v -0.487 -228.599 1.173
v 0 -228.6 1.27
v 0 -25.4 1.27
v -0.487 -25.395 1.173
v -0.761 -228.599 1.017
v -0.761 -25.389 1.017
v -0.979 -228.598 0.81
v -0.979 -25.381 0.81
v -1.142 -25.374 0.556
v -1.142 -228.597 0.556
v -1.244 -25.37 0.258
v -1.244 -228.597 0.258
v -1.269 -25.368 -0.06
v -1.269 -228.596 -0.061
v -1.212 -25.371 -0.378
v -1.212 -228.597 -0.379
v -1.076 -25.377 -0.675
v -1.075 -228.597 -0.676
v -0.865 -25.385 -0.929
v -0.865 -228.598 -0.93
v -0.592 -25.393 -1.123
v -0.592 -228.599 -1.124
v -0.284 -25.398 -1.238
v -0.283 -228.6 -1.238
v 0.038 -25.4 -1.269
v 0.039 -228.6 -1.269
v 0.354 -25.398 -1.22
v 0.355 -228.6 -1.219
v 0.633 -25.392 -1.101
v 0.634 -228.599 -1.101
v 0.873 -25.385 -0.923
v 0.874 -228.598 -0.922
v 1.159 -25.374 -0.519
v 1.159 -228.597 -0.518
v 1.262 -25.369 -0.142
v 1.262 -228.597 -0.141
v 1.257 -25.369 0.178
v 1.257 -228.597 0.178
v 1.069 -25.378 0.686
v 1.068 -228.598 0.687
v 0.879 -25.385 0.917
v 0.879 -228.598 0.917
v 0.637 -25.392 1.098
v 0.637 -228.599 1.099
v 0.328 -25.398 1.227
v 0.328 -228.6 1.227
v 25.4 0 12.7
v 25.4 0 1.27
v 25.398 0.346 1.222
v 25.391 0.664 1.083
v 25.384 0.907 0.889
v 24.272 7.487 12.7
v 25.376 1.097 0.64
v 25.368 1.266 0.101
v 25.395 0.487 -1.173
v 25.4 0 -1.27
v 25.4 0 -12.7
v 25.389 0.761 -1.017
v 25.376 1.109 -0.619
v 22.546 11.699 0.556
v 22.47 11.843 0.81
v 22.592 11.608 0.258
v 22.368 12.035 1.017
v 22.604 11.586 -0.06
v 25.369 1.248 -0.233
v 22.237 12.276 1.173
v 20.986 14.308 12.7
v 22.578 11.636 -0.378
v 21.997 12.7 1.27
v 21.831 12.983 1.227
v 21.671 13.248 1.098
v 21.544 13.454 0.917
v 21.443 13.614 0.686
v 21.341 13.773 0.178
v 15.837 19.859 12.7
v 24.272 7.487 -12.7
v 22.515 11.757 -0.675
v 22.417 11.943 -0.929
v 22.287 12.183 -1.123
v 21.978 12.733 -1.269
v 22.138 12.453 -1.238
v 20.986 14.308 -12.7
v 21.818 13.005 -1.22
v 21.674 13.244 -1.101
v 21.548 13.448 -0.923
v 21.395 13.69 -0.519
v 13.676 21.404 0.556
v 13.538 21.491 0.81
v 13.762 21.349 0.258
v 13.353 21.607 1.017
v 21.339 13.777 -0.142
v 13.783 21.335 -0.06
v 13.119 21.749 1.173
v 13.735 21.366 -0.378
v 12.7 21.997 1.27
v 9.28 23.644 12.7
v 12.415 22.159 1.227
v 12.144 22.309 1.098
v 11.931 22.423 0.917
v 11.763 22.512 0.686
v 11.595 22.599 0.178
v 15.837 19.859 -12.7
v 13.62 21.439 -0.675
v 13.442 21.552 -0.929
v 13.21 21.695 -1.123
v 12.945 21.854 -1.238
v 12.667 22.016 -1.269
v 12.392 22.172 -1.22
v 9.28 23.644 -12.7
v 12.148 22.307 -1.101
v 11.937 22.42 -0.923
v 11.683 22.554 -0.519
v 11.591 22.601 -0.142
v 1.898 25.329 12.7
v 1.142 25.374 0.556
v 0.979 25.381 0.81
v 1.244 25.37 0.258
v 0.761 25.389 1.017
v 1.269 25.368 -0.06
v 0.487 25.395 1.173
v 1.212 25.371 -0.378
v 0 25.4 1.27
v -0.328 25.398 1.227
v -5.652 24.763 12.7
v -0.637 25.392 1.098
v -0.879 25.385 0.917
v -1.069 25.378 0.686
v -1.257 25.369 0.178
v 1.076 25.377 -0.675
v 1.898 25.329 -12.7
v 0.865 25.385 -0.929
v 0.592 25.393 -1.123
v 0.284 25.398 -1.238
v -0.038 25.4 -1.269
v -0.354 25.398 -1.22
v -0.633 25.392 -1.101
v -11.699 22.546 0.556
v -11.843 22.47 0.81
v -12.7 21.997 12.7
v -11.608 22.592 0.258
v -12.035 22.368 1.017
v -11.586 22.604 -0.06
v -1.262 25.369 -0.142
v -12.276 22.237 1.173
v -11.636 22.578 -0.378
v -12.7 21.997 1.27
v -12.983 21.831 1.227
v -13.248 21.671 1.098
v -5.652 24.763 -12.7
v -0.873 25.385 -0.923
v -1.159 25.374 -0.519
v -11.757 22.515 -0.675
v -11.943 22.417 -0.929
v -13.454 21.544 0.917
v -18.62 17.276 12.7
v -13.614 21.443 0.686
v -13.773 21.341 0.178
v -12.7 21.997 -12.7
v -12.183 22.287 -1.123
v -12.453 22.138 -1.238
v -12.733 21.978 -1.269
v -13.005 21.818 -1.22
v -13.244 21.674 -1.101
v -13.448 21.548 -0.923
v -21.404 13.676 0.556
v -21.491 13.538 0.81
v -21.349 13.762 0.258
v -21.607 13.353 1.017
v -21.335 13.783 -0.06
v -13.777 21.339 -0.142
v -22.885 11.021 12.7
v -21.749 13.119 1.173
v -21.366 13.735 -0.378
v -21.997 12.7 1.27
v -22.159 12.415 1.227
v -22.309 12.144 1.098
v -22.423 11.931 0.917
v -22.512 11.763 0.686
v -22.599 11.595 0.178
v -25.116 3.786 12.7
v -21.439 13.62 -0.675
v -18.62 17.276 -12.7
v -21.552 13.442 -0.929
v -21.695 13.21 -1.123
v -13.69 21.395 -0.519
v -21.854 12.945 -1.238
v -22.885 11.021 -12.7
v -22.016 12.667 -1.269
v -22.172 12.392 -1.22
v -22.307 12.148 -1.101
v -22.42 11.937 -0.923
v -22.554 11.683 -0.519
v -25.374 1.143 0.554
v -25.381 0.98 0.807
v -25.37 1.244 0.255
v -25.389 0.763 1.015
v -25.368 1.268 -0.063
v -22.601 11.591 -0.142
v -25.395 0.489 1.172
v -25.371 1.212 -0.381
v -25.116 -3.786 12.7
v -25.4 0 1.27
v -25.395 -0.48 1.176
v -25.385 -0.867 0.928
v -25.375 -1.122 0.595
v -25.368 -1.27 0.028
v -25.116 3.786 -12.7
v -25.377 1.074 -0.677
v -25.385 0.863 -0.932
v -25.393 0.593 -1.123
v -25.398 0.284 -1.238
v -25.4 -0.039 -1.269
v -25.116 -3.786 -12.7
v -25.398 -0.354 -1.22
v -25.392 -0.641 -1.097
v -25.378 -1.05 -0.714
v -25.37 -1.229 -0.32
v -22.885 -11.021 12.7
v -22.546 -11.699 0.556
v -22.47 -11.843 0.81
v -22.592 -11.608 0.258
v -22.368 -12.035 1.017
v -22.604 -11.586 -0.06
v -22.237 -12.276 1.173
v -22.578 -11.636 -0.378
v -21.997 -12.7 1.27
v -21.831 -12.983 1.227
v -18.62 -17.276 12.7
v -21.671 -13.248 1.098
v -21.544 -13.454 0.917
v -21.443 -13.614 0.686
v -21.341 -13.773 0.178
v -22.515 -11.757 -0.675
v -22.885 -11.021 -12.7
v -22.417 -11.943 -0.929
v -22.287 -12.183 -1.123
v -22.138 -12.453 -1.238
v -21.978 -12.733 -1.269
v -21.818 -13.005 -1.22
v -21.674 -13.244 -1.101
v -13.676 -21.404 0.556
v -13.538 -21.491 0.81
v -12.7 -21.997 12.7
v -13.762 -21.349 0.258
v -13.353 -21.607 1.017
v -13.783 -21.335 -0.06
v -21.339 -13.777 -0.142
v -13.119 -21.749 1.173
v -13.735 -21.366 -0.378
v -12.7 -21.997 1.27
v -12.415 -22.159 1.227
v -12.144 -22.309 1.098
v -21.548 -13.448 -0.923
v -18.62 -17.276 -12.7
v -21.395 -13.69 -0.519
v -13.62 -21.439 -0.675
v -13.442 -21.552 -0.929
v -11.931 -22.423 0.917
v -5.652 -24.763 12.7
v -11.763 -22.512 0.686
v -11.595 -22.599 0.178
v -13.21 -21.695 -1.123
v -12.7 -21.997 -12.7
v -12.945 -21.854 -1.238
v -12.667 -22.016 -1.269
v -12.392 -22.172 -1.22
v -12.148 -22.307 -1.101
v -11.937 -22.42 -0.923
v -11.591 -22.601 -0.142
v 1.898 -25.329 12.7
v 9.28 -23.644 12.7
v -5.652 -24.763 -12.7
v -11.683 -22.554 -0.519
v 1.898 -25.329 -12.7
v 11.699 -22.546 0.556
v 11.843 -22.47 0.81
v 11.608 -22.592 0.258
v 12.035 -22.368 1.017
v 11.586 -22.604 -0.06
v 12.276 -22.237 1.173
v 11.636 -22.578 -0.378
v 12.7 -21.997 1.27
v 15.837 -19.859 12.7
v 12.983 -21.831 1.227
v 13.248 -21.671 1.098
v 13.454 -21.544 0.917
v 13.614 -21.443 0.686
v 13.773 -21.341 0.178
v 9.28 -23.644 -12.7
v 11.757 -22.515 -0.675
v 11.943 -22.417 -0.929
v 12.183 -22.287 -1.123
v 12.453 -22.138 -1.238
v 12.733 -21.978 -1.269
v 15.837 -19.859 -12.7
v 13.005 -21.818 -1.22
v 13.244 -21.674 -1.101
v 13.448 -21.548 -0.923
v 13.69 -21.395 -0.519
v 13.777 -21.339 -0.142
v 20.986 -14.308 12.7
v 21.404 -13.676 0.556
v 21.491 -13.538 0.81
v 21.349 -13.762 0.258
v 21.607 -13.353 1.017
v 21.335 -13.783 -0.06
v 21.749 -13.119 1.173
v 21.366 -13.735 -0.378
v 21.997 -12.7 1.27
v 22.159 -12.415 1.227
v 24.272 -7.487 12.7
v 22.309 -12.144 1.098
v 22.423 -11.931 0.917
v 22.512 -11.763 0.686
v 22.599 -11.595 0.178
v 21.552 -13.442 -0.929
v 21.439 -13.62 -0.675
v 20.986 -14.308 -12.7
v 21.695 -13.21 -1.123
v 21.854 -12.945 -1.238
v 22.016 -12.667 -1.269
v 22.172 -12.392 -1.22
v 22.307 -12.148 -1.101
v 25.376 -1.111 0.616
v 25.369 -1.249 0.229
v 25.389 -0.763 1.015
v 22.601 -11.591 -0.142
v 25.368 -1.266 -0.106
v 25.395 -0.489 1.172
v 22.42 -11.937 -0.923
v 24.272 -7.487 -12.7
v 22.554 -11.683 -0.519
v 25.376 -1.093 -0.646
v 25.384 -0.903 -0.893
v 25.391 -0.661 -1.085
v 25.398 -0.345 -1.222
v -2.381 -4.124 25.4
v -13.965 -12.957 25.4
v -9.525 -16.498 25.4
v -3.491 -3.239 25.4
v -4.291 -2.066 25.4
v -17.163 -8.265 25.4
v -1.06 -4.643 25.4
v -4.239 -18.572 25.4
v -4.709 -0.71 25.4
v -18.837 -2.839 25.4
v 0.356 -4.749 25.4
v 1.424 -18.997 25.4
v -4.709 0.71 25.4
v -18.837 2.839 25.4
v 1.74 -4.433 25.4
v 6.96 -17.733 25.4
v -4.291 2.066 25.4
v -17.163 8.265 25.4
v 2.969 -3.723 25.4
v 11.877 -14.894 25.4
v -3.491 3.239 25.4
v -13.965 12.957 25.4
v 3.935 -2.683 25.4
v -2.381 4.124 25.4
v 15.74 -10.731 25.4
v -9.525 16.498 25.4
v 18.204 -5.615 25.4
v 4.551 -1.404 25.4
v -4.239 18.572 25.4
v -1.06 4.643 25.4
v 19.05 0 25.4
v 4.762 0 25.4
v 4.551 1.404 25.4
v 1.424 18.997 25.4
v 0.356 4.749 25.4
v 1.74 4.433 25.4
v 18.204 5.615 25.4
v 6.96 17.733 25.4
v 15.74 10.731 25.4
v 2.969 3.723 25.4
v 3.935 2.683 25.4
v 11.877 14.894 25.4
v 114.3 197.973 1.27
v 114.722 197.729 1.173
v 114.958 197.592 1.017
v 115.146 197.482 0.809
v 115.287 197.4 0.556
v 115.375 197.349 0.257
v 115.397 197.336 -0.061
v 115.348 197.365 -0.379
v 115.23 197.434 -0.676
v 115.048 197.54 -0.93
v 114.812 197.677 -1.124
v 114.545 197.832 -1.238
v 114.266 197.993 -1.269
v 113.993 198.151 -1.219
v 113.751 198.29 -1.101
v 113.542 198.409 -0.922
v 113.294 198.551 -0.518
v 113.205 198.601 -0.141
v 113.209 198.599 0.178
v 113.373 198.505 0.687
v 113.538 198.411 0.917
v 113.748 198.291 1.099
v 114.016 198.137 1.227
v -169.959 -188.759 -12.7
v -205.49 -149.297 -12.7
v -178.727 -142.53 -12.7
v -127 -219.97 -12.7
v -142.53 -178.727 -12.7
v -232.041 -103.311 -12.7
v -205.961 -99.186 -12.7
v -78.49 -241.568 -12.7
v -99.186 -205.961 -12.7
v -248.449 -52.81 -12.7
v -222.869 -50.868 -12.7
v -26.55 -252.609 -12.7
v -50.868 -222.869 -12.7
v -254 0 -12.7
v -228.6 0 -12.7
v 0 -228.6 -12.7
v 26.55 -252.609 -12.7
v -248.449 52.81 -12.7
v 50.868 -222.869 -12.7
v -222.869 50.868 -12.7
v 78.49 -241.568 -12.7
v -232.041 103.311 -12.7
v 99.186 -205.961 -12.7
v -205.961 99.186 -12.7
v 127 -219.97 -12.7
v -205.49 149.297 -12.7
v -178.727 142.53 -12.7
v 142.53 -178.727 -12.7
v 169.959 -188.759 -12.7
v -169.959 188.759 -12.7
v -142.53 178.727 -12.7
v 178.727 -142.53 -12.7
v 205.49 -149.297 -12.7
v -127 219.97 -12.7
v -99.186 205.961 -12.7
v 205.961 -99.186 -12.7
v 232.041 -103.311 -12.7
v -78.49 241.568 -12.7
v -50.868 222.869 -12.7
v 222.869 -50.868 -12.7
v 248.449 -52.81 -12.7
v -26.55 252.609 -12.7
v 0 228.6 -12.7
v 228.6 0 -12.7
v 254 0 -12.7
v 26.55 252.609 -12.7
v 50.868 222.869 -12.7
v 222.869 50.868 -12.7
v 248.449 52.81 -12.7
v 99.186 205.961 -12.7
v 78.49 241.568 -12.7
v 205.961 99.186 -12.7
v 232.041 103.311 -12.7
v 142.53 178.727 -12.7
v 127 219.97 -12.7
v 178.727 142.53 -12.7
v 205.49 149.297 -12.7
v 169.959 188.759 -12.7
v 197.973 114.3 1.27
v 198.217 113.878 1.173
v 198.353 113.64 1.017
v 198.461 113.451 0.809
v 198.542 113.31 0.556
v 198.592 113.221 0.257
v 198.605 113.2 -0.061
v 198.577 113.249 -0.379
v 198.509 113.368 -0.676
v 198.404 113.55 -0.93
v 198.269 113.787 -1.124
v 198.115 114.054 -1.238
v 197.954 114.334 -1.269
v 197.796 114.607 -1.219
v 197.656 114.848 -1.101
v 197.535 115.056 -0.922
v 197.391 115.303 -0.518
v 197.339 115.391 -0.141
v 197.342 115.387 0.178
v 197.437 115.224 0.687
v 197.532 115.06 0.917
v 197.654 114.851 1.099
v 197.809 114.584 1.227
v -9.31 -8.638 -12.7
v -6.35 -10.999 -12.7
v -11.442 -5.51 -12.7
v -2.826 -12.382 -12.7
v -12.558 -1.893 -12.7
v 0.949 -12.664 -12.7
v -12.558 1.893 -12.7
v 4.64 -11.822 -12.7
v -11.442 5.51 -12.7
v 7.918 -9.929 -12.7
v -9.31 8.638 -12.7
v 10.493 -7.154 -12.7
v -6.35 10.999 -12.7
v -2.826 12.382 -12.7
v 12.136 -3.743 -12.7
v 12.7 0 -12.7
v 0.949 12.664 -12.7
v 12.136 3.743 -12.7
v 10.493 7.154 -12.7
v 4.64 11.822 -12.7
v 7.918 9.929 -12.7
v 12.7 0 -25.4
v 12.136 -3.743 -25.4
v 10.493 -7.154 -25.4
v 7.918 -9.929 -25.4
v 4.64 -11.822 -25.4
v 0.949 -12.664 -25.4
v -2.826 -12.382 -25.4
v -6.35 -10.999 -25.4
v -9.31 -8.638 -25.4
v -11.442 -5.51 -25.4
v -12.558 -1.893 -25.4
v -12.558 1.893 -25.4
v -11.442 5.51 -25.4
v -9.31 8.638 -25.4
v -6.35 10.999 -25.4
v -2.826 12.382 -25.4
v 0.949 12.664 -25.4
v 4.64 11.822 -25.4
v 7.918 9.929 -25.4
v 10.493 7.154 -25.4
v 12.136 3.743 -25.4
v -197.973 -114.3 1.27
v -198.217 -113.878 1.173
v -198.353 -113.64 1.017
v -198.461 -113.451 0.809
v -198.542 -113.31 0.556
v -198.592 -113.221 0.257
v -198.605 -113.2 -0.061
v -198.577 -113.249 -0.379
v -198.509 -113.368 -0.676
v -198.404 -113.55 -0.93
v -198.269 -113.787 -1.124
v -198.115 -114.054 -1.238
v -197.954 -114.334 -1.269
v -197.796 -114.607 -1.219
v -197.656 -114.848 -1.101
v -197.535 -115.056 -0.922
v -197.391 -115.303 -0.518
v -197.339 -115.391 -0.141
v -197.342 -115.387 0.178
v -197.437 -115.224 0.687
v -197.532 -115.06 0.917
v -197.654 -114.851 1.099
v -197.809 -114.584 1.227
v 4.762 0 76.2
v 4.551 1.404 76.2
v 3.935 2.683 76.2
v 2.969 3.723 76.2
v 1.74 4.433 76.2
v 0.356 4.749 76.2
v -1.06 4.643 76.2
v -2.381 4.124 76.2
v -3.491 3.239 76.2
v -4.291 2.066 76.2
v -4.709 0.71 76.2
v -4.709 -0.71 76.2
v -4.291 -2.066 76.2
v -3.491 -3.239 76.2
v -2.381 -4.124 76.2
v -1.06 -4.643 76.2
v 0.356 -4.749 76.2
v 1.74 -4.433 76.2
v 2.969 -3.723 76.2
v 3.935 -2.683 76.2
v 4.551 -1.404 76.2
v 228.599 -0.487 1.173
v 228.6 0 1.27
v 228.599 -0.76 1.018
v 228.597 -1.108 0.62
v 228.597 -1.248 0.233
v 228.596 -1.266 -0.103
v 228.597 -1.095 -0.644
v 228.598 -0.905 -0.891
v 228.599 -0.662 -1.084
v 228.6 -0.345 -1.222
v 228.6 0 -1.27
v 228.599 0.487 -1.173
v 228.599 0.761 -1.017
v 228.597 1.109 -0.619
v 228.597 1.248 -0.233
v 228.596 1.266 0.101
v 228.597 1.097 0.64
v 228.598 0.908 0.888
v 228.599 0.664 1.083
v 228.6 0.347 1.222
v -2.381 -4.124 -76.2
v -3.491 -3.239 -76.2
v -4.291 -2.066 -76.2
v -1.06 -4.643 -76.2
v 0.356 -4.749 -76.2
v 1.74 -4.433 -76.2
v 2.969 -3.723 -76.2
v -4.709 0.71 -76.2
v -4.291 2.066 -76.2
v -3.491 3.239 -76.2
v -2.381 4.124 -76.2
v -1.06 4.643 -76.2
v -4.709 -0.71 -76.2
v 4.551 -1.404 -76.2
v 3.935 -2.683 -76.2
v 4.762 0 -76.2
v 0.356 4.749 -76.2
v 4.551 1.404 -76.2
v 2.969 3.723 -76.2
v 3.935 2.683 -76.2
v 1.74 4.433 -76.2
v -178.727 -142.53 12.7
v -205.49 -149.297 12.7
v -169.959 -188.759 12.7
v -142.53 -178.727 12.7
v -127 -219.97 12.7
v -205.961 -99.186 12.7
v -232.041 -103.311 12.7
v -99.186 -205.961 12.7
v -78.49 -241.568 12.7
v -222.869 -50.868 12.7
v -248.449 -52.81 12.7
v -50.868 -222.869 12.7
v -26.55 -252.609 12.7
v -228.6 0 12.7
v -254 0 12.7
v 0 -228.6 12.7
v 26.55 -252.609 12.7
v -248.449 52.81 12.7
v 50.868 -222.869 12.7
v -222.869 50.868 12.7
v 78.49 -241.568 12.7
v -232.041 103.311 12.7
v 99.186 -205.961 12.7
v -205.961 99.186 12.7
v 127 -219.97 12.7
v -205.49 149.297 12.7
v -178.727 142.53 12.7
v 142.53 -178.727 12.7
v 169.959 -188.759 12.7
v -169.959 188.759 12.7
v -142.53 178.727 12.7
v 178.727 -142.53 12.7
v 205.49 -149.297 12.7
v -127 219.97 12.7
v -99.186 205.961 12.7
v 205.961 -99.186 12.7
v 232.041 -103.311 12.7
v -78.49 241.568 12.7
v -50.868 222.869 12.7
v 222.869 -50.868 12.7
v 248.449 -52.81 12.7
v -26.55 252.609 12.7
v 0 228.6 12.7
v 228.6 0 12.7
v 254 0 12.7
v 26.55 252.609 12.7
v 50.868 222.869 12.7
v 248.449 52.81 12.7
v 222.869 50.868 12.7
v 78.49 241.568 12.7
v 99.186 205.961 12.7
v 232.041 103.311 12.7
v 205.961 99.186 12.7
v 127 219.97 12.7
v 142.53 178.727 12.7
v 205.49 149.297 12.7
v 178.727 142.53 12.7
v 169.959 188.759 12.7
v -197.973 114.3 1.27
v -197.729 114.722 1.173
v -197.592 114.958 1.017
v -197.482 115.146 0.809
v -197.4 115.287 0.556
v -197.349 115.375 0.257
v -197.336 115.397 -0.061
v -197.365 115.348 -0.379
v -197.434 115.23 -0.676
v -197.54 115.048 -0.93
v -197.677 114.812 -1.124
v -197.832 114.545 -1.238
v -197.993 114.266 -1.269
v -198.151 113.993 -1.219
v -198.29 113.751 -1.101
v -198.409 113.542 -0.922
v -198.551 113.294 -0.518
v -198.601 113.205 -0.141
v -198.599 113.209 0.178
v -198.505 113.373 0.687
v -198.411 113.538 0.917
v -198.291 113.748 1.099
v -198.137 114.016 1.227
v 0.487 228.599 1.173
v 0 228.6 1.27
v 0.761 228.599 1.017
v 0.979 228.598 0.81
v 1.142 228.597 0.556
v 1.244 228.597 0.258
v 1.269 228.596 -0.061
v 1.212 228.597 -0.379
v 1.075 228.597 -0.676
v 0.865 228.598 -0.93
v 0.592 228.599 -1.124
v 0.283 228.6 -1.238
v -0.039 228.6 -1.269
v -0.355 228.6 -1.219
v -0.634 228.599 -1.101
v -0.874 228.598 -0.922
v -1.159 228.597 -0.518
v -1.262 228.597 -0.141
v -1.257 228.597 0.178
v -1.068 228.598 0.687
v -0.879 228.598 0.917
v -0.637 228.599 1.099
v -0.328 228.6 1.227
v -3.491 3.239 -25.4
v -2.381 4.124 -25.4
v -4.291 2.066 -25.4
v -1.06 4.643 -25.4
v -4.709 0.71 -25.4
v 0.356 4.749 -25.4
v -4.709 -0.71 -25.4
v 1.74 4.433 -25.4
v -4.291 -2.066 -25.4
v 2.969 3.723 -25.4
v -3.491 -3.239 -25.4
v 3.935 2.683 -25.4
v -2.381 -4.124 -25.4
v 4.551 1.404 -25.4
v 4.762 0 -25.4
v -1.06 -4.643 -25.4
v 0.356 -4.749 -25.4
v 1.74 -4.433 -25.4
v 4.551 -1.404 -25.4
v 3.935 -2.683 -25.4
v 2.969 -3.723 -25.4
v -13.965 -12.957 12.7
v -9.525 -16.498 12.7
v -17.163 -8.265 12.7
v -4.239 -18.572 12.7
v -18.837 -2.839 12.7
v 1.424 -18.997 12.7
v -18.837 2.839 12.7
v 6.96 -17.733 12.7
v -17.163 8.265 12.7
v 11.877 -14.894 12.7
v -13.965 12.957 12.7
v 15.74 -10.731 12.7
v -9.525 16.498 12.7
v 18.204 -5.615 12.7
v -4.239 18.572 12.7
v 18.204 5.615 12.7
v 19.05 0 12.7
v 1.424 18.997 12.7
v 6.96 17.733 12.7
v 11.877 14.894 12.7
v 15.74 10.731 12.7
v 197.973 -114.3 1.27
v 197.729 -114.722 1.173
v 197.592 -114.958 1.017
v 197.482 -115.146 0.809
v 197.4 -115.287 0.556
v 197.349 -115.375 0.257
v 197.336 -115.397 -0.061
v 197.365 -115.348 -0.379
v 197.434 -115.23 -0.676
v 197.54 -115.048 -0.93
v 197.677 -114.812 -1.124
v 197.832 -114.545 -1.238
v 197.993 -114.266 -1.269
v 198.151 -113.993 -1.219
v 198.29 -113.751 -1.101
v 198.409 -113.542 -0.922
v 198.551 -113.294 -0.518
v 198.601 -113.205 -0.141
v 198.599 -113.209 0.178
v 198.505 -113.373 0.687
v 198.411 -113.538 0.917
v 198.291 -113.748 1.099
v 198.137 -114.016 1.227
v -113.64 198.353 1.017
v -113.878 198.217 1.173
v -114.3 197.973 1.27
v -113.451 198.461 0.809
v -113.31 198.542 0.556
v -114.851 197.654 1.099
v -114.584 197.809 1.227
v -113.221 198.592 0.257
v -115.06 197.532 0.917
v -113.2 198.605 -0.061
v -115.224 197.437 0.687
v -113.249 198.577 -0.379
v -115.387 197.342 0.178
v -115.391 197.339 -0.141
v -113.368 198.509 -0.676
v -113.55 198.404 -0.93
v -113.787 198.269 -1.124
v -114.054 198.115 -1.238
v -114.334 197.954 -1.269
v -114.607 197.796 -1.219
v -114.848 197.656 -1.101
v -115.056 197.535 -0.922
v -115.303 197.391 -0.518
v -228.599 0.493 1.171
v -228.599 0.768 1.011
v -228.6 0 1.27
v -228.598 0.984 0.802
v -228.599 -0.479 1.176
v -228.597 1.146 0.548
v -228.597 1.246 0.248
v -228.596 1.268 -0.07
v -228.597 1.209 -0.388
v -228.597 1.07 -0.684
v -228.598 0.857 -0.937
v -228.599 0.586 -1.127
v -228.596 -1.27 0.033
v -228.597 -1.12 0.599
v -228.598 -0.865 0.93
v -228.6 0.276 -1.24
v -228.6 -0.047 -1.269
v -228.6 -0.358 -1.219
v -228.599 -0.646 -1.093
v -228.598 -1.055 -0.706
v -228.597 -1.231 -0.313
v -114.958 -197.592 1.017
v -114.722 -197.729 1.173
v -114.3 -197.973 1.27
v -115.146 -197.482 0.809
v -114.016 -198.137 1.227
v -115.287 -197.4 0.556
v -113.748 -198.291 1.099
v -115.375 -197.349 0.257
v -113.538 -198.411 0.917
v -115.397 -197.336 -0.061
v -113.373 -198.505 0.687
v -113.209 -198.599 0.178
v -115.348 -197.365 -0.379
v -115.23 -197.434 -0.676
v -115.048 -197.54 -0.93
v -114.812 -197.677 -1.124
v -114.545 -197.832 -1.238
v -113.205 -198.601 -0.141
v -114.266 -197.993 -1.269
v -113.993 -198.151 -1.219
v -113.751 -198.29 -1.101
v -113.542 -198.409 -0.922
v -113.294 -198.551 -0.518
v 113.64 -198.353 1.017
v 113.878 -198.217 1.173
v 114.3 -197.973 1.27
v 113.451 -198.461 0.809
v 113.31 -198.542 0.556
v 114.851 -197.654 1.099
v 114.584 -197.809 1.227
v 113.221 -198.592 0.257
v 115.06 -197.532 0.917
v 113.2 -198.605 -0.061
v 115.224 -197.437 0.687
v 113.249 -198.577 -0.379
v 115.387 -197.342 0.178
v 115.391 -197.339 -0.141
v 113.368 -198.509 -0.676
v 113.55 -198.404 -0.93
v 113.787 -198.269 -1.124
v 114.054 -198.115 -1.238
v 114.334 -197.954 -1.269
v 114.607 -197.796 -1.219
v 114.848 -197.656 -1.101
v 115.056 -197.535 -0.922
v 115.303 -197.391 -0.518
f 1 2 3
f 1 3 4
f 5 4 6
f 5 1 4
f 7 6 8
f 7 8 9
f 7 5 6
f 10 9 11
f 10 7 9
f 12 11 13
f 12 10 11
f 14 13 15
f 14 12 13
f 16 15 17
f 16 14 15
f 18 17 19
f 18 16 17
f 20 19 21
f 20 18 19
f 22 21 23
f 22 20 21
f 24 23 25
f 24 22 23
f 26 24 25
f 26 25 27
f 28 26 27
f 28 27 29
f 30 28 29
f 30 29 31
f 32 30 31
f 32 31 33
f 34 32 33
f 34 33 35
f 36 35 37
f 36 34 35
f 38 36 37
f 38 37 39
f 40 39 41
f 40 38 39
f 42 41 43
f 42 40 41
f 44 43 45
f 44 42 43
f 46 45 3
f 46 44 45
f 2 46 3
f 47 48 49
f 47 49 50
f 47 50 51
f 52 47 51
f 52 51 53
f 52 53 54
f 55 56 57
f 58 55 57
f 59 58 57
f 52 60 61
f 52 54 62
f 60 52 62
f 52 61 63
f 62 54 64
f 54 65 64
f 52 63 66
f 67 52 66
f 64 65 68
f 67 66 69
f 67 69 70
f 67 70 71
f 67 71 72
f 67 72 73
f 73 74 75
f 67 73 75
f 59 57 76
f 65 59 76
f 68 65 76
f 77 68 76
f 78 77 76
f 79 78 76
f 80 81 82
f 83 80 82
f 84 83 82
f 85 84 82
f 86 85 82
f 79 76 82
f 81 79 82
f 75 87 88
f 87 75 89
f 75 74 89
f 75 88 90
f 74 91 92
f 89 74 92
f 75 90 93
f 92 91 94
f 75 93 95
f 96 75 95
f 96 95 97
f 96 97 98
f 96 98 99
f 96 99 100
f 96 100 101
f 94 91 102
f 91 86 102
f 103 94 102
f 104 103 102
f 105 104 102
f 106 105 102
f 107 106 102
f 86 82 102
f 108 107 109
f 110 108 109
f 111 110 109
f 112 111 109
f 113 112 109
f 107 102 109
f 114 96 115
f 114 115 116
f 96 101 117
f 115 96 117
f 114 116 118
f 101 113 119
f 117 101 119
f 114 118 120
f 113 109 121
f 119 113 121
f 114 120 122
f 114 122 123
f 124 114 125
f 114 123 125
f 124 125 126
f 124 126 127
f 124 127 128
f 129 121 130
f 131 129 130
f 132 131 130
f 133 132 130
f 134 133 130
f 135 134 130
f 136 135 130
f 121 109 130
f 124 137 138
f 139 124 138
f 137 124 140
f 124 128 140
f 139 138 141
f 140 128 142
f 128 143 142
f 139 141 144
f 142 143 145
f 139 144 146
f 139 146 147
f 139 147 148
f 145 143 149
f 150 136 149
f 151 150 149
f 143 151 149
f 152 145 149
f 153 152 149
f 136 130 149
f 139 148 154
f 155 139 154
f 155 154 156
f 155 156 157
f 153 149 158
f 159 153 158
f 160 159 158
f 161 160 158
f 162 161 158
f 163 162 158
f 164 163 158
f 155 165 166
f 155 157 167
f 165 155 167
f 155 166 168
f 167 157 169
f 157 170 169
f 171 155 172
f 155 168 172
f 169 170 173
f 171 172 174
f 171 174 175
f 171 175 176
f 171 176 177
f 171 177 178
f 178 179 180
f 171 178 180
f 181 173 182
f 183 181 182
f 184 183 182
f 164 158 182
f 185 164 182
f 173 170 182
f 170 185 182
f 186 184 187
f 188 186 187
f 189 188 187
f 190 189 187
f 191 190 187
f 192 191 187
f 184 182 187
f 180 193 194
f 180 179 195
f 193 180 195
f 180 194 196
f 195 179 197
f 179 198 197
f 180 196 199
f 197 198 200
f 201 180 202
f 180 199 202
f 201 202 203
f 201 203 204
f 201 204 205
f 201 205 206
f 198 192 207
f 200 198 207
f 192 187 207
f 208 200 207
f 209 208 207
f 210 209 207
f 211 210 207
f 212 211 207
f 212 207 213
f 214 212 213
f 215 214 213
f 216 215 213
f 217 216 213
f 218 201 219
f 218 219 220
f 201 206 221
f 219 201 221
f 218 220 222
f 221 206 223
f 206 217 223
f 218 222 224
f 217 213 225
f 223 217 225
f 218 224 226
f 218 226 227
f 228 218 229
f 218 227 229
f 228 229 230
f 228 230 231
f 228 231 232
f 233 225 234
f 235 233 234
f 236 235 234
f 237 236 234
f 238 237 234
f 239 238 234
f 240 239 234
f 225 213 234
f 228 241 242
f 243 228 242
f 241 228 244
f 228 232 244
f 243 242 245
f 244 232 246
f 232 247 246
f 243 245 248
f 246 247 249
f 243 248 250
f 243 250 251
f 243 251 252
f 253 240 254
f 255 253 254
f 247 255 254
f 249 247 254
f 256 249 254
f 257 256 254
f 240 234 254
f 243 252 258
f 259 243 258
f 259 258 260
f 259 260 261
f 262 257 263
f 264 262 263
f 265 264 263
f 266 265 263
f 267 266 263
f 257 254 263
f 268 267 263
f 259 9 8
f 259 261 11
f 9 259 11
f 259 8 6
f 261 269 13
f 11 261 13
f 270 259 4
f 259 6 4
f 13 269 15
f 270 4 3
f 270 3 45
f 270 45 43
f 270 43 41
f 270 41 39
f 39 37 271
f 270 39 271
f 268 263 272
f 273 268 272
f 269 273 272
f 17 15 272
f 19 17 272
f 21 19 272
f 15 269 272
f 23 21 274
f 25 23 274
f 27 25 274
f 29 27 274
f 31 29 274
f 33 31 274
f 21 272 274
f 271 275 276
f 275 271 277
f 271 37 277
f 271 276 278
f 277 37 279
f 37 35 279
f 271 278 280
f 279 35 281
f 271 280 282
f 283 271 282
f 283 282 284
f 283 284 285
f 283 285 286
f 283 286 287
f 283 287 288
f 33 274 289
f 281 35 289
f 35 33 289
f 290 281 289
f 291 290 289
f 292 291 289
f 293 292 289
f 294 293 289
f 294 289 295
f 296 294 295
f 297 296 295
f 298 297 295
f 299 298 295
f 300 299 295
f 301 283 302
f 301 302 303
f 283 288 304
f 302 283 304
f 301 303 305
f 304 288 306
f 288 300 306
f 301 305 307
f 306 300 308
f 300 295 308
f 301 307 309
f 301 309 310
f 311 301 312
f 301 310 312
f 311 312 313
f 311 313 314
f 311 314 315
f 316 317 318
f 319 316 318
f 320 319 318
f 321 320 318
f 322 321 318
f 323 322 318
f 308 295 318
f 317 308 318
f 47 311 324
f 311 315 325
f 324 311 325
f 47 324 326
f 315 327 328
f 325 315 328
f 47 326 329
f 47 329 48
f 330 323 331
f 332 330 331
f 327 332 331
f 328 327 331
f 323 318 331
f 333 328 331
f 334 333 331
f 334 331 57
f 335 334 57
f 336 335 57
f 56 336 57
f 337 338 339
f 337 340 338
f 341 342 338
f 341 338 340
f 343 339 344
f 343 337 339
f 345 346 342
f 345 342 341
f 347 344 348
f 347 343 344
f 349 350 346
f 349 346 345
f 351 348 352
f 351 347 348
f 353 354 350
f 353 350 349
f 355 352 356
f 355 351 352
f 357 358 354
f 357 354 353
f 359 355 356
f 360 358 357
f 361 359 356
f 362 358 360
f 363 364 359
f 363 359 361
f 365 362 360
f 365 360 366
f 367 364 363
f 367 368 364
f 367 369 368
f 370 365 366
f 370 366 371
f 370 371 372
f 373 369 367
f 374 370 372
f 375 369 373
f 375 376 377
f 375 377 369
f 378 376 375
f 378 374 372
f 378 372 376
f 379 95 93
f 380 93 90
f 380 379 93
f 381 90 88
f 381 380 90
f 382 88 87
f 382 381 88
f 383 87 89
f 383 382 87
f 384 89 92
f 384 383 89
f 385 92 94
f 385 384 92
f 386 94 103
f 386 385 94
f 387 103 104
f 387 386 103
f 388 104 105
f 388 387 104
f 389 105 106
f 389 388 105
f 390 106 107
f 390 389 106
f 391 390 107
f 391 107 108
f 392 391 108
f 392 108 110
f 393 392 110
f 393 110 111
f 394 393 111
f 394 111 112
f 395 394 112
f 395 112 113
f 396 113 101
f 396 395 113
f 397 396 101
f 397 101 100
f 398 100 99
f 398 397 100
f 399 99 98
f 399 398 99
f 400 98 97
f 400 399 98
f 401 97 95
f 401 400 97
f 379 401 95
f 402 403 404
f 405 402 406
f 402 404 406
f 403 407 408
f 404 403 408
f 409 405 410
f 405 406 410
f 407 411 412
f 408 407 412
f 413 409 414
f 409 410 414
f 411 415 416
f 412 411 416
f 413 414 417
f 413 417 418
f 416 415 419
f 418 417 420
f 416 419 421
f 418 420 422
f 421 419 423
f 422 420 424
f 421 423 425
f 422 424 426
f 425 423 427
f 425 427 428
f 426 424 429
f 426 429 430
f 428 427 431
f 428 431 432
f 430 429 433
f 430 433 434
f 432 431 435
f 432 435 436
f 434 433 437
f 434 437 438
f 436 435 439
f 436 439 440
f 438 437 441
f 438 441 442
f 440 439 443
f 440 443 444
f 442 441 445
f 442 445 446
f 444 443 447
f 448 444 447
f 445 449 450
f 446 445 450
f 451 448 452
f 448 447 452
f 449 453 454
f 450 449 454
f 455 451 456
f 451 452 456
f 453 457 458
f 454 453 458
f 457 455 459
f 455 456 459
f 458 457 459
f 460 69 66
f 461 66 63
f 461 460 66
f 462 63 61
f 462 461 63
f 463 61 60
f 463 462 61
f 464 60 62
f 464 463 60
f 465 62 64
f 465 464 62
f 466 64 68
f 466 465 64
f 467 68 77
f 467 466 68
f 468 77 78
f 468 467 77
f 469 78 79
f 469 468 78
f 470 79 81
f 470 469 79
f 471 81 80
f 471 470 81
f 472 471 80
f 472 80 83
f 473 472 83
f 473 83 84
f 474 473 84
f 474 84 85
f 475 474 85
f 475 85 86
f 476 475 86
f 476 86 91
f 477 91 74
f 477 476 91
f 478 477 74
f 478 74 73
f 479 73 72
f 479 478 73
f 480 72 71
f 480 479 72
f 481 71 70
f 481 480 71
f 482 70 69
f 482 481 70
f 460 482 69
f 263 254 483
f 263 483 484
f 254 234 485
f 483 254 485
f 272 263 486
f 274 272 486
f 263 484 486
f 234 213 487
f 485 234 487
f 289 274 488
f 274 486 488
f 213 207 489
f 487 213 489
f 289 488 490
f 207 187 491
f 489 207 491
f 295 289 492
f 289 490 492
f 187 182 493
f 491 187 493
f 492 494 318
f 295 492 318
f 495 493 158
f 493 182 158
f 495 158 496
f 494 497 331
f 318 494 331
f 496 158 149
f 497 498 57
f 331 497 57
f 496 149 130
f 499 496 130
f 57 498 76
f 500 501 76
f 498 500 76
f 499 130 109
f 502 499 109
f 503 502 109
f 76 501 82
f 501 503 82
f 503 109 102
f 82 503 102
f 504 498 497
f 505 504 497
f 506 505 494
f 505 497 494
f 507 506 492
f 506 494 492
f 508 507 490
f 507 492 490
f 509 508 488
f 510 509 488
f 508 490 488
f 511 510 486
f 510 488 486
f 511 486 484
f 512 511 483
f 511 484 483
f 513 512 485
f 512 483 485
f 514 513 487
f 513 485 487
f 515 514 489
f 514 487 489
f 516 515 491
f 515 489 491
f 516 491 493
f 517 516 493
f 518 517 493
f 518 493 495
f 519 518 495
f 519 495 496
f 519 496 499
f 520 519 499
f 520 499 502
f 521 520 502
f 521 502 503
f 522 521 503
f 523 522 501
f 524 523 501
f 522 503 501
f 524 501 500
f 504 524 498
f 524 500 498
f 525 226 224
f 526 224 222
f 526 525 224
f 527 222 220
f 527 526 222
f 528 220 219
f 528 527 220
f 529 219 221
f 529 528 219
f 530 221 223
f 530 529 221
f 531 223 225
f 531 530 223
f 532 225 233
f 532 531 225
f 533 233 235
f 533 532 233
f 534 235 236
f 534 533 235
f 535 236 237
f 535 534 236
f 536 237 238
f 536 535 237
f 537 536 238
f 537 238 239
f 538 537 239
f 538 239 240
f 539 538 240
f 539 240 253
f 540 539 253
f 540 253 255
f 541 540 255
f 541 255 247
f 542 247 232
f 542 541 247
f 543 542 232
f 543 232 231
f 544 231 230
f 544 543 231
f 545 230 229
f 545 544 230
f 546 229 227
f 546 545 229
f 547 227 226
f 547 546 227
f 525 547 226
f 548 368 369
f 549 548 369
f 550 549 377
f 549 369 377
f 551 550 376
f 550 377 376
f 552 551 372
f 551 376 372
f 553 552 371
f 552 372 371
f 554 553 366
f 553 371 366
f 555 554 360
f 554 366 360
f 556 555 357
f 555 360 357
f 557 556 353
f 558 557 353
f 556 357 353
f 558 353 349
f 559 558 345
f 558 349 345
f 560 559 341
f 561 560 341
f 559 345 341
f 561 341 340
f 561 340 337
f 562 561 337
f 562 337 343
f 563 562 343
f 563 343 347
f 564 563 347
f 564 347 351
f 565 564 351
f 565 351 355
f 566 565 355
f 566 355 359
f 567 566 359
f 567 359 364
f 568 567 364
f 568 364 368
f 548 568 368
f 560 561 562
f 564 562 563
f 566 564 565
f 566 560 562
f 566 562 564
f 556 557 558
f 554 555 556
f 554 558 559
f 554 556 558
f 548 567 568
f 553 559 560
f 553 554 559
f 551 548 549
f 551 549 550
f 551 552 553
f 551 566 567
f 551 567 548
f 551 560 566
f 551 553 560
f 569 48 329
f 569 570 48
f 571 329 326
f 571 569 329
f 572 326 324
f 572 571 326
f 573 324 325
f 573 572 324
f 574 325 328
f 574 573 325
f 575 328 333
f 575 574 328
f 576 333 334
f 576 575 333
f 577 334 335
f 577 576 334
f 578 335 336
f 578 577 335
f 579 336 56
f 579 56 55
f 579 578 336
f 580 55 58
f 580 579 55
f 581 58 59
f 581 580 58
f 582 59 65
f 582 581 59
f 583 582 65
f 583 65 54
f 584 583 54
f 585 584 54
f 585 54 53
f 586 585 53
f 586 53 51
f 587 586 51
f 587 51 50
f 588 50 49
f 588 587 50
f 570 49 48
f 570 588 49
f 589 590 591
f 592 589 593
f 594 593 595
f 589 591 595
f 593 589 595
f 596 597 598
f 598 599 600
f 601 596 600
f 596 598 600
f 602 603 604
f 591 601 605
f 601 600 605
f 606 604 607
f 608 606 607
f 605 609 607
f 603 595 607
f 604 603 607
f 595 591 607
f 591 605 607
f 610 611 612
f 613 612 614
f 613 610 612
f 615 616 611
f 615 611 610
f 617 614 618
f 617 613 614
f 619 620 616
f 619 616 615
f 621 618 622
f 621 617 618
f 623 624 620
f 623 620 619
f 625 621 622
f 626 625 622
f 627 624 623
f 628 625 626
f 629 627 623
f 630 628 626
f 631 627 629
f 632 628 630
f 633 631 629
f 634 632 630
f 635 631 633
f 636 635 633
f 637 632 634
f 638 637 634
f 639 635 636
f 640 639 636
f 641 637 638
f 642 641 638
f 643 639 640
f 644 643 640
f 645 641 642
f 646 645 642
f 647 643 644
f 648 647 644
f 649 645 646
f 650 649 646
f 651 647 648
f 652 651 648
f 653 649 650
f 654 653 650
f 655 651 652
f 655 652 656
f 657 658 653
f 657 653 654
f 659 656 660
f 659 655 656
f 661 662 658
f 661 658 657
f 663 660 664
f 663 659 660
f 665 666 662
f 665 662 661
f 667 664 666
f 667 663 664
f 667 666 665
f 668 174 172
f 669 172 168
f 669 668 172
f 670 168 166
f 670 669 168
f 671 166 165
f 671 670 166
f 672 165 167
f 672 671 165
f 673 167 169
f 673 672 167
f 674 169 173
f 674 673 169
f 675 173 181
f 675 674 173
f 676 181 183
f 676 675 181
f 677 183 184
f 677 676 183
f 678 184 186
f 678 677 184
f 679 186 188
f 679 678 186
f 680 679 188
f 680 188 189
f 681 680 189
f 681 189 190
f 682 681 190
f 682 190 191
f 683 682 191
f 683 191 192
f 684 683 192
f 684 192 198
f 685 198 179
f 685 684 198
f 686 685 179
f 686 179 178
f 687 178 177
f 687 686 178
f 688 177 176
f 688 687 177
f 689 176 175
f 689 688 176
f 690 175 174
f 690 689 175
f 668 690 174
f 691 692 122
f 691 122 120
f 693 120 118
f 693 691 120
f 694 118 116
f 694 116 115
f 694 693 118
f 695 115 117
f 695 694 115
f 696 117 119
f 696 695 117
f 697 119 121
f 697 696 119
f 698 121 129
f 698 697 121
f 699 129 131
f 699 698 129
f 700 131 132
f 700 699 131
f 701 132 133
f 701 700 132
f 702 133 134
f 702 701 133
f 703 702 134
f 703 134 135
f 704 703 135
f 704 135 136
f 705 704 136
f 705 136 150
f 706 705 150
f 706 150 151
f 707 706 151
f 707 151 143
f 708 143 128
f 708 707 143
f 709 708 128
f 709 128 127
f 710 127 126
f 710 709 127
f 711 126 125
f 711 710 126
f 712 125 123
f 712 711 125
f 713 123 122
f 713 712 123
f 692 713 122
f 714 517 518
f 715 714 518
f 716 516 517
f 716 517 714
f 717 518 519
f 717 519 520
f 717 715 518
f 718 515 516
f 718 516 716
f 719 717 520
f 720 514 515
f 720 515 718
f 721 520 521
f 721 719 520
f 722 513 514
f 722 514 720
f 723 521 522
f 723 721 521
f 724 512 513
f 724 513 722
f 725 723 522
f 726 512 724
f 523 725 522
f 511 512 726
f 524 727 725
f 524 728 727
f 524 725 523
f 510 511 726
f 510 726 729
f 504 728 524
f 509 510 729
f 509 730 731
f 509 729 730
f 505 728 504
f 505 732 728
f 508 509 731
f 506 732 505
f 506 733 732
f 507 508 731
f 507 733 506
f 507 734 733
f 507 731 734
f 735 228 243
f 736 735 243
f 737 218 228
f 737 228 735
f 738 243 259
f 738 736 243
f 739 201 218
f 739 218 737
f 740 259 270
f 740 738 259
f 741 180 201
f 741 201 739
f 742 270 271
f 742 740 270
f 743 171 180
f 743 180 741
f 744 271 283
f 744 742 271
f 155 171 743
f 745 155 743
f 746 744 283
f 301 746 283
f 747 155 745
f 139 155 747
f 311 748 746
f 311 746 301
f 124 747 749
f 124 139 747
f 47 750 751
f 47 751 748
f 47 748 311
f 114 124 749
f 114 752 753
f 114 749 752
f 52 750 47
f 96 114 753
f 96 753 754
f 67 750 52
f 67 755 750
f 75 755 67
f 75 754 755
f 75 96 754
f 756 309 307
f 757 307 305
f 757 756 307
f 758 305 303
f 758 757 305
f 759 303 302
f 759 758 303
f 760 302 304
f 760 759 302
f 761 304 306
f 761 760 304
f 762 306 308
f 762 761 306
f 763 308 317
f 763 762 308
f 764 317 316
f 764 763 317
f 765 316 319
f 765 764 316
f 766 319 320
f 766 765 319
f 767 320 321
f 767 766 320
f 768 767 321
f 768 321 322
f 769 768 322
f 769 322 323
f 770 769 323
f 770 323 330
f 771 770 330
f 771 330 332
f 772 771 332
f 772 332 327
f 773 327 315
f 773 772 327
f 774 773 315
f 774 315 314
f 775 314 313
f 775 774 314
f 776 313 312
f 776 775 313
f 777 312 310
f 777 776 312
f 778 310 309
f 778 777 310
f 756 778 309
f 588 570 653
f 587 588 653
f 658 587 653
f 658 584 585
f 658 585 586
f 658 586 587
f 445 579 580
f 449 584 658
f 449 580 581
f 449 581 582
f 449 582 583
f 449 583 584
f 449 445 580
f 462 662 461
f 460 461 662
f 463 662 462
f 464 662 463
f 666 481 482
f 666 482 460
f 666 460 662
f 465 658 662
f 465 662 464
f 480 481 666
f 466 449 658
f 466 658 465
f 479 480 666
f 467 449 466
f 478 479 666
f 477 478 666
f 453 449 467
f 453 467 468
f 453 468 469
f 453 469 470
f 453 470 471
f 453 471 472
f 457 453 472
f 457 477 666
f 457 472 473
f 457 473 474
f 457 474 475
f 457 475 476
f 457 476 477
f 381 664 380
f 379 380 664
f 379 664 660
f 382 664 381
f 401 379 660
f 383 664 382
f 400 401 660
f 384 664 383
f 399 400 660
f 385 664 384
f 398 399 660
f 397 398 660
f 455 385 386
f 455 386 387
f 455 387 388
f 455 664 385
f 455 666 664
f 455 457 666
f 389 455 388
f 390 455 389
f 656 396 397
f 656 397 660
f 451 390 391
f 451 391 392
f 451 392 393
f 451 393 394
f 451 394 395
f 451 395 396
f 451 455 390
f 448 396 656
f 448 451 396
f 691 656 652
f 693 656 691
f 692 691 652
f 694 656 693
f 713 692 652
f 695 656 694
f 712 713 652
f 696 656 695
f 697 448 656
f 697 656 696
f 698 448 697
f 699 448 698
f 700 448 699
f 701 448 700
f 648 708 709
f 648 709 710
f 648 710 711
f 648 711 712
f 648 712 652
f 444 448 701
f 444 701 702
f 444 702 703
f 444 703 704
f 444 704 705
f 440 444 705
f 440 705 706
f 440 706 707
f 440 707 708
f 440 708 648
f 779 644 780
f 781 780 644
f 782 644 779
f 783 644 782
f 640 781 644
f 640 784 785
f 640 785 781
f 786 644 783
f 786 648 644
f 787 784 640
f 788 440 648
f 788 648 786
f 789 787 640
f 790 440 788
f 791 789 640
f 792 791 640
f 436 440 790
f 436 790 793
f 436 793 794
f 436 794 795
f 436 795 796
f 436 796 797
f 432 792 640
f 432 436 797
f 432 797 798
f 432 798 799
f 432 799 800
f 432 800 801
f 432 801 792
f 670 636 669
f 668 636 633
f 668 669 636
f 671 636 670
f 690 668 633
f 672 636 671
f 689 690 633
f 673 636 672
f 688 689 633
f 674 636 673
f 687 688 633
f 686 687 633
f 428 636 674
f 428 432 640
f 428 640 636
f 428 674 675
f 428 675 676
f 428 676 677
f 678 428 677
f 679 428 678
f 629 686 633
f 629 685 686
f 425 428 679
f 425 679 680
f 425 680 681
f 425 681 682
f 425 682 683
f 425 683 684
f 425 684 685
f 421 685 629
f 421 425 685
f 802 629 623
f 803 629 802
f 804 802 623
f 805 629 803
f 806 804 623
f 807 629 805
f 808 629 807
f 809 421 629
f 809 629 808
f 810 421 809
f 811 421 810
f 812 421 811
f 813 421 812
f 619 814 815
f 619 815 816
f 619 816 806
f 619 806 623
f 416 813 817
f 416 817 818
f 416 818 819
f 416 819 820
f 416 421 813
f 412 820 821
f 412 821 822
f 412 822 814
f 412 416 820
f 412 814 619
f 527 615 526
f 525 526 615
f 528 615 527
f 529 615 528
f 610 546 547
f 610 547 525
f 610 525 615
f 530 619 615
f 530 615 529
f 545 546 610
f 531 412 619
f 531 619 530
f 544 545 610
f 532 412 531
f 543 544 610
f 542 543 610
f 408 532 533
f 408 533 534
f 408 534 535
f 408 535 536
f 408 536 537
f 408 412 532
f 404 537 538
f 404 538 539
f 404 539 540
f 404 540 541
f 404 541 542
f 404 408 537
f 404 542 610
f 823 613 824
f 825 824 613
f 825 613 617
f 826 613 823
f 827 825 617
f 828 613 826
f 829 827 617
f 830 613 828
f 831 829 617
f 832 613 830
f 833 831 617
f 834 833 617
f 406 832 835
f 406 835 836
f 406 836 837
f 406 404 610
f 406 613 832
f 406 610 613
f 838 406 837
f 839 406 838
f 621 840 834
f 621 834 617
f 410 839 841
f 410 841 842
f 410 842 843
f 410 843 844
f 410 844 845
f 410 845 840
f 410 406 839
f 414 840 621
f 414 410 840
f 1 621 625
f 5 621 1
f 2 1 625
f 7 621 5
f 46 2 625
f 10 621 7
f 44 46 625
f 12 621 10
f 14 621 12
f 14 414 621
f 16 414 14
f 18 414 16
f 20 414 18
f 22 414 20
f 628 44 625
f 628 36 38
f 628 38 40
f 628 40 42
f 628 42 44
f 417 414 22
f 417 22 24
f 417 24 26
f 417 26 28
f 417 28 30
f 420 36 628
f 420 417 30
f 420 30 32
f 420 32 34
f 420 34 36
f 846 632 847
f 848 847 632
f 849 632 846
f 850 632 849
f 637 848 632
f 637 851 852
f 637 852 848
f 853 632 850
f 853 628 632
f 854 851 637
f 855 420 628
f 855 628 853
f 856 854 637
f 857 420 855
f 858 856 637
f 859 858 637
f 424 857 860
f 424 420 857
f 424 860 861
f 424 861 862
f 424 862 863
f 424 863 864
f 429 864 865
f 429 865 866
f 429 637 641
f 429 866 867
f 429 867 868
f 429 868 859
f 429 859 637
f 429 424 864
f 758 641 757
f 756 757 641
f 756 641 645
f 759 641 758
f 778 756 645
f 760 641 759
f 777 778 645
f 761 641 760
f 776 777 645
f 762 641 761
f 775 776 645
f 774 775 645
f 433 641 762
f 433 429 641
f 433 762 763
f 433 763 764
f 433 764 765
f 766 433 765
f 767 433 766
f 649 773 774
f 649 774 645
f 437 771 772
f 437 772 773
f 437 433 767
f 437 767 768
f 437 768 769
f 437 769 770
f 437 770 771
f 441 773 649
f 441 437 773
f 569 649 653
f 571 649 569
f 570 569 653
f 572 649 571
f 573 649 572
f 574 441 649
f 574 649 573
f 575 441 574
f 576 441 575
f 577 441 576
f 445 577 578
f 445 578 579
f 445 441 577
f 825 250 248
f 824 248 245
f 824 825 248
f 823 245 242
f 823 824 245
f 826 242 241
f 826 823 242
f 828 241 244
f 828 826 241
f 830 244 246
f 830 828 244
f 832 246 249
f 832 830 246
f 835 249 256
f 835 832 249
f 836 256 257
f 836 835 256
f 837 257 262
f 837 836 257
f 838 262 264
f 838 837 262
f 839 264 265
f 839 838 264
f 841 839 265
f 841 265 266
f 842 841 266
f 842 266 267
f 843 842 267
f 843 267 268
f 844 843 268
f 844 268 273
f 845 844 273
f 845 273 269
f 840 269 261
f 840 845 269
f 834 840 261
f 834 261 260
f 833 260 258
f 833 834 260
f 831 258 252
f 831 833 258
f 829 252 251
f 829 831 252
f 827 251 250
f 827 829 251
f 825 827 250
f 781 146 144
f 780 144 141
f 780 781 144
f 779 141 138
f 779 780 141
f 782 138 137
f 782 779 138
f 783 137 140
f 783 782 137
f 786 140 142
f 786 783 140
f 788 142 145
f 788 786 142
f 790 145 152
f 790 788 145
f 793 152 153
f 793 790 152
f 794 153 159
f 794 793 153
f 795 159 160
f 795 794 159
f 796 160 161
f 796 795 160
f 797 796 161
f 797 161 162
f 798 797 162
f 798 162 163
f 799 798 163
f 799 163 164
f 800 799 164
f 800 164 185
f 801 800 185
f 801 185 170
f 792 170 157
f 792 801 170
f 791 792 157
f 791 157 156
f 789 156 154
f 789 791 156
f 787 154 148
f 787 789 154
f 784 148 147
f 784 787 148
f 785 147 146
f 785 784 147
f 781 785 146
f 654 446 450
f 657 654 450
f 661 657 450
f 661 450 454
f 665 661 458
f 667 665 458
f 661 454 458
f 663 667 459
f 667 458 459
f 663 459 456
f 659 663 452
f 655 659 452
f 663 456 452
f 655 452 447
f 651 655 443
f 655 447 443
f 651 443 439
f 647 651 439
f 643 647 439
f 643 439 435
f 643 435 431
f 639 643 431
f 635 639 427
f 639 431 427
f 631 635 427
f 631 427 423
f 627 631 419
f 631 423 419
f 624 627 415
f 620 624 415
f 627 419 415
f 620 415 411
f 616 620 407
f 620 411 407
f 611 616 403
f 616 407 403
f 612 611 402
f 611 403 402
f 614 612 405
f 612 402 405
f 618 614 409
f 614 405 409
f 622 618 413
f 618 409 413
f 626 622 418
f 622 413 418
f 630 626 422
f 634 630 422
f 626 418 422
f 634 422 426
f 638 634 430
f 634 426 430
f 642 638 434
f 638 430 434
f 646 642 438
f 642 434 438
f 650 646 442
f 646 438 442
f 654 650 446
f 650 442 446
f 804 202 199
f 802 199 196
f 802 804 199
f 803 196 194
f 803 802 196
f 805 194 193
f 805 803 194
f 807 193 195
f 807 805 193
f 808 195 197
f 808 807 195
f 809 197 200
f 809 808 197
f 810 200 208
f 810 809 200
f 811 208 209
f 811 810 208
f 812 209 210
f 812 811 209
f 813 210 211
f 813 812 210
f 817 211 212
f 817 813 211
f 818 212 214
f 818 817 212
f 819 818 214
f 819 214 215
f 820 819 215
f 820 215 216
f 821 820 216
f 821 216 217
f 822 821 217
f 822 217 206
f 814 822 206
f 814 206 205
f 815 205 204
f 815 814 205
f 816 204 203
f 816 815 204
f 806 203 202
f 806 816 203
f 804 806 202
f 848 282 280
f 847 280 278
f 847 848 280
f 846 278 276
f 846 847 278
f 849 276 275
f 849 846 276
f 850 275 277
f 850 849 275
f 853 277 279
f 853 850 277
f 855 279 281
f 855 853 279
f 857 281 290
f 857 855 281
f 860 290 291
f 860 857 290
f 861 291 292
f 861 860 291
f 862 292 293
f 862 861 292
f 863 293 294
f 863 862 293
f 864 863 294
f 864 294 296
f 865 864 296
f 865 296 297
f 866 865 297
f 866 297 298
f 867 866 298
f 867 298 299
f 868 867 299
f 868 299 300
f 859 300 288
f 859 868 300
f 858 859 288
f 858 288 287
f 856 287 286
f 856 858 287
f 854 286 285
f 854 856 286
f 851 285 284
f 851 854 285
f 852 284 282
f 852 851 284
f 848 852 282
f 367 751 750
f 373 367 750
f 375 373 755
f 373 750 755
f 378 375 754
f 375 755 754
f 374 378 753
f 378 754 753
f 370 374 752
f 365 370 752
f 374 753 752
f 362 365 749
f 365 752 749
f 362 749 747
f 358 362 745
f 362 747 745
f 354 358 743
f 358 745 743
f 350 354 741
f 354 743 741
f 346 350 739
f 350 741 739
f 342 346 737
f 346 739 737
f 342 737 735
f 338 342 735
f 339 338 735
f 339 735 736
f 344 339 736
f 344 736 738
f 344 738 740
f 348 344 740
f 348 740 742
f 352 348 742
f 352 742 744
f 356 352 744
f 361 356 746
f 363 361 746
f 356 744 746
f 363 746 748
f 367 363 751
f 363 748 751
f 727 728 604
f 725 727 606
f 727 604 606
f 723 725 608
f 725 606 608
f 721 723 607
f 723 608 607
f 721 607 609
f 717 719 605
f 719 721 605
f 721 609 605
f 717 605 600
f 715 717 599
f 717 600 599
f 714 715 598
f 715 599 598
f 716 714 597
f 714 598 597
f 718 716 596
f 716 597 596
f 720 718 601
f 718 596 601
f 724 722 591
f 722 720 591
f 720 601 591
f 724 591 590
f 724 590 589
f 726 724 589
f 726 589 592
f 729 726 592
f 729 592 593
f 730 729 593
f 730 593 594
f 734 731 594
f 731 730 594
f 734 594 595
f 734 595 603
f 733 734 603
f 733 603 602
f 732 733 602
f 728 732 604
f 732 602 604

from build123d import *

# Parameters (mm, degrees)
BOSS_EXTRUDE1_DEPTH      = 12.7
BOSS_EXTRUDE1_DEPTH_BACK = 12.7
SKETCH1_R                = 25.4
SWEEP1_PROFILE_R         = 1.27
CIRPATTERN1_COUNT        = 12
BOSS_EXTRUDE2_DEPTH      = 12.7
BOSS_EXTRUDE2_DEPTH_BACK = 12.7
SKETCH43_R               = 254
SKETCH43_R_2             = 228.6
SKETCH44_R               = 19.05
BOSS_EXTRUDE3_DEPTH      = 12.7
SKETCH46_R               = 12.7
BOSS_EXTRUDE4_DEPTH      = 12.7
BOSS_EXTRUDE5_DEPTH      = 76.2
BOSS_EXTRUDE5_DEPTH_BACK = 76.2
SKETCH47_R               = 4.7625


with BuildPart() as part:
    # Sketch1 → Boss-Extrude1 (new, two sides: drawn at the far end of the back side and taken through both)
    with BuildSketch(Plane.XY.offset(-BOSS_EXTRUDE1_DEPTH_BACK)):
        Circle(SKETCH1_R)
    extrude(amount=BOSS_EXTRUDE1_DEPTH + BOSS_EXTRUDE1_DEPTH_BACK)

    # Sweep1: sweep along a path in Sketch2
    with BuildLine(Plane.XY) as sweep1_path:
        Line((0, 0), (228.6, 0))
    # Sweep1 profile (on start of the path) → Sweep1 (sweep)
    with BuildSketch(Plane(origin=(0, 0, 0), x_dir=(0, 0, 1), z_dir=(1, 0, 0))):
        Circle(SWEEP1_PROFILE_R)
    sweep1 = sweep(path=sweep1_path.line)

    # CirPattern1: Sweep1 ×12 about axis
    cirpattern1_axis = Axis((0, 0, 12.7), (0, 0, 1))
    for i in range(1, CIRPATTERN1_COUNT):
        add(sweep1.rotate(cirpattern1_axis, i * 360 / CIRPATTERN1_COUNT))

    # Sketch43 → Boss-Extrude2 (add, two sides: drawn at the far end of the back side and taken through both)
    with BuildSketch(Plane.XY.offset(-BOSS_EXTRUDE2_DEPTH_BACK)):
        Circle(SKETCH43_R)
        Circle(SKETCH43_R_2, mode=Mode.SUBTRACT)
    extrude(amount=BOSS_EXTRUDE2_DEPTH + BOSS_EXTRUDE2_DEPTH_BACK)

    # Sketch44 → Boss-Extrude3 (add)
    with BuildSketch(Plane.XY.offset(12.7)):
        Circle(SKETCH44_R)
    extrude(amount=BOSS_EXTRUDE3_DEPTH)

    # Sketch46 → Boss-Extrude4 (add)
    with BuildSketch(Plane(origin=(0, 0, -12.7), x_dir=(-1, 0, 0), z_dir=(0, 0, -1))):
        Circle(SKETCH46_R)
    extrude(amount=BOSS_EXTRUDE4_DEPTH)

    # Sketch47 → Boss-Extrude5 (add, two sides: drawn at the far end of the back side and taken through both)
    with BuildSketch(Plane.XY.offset(-BOSS_EXTRUDE5_DEPTH_BACK)):
        Circle(SKETCH47_R)
    extrude(amount=BOSS_EXTRUDE5_DEPTH + BOSS_EXTRUDE5_DEPTH_BACK)


solid = part.part
